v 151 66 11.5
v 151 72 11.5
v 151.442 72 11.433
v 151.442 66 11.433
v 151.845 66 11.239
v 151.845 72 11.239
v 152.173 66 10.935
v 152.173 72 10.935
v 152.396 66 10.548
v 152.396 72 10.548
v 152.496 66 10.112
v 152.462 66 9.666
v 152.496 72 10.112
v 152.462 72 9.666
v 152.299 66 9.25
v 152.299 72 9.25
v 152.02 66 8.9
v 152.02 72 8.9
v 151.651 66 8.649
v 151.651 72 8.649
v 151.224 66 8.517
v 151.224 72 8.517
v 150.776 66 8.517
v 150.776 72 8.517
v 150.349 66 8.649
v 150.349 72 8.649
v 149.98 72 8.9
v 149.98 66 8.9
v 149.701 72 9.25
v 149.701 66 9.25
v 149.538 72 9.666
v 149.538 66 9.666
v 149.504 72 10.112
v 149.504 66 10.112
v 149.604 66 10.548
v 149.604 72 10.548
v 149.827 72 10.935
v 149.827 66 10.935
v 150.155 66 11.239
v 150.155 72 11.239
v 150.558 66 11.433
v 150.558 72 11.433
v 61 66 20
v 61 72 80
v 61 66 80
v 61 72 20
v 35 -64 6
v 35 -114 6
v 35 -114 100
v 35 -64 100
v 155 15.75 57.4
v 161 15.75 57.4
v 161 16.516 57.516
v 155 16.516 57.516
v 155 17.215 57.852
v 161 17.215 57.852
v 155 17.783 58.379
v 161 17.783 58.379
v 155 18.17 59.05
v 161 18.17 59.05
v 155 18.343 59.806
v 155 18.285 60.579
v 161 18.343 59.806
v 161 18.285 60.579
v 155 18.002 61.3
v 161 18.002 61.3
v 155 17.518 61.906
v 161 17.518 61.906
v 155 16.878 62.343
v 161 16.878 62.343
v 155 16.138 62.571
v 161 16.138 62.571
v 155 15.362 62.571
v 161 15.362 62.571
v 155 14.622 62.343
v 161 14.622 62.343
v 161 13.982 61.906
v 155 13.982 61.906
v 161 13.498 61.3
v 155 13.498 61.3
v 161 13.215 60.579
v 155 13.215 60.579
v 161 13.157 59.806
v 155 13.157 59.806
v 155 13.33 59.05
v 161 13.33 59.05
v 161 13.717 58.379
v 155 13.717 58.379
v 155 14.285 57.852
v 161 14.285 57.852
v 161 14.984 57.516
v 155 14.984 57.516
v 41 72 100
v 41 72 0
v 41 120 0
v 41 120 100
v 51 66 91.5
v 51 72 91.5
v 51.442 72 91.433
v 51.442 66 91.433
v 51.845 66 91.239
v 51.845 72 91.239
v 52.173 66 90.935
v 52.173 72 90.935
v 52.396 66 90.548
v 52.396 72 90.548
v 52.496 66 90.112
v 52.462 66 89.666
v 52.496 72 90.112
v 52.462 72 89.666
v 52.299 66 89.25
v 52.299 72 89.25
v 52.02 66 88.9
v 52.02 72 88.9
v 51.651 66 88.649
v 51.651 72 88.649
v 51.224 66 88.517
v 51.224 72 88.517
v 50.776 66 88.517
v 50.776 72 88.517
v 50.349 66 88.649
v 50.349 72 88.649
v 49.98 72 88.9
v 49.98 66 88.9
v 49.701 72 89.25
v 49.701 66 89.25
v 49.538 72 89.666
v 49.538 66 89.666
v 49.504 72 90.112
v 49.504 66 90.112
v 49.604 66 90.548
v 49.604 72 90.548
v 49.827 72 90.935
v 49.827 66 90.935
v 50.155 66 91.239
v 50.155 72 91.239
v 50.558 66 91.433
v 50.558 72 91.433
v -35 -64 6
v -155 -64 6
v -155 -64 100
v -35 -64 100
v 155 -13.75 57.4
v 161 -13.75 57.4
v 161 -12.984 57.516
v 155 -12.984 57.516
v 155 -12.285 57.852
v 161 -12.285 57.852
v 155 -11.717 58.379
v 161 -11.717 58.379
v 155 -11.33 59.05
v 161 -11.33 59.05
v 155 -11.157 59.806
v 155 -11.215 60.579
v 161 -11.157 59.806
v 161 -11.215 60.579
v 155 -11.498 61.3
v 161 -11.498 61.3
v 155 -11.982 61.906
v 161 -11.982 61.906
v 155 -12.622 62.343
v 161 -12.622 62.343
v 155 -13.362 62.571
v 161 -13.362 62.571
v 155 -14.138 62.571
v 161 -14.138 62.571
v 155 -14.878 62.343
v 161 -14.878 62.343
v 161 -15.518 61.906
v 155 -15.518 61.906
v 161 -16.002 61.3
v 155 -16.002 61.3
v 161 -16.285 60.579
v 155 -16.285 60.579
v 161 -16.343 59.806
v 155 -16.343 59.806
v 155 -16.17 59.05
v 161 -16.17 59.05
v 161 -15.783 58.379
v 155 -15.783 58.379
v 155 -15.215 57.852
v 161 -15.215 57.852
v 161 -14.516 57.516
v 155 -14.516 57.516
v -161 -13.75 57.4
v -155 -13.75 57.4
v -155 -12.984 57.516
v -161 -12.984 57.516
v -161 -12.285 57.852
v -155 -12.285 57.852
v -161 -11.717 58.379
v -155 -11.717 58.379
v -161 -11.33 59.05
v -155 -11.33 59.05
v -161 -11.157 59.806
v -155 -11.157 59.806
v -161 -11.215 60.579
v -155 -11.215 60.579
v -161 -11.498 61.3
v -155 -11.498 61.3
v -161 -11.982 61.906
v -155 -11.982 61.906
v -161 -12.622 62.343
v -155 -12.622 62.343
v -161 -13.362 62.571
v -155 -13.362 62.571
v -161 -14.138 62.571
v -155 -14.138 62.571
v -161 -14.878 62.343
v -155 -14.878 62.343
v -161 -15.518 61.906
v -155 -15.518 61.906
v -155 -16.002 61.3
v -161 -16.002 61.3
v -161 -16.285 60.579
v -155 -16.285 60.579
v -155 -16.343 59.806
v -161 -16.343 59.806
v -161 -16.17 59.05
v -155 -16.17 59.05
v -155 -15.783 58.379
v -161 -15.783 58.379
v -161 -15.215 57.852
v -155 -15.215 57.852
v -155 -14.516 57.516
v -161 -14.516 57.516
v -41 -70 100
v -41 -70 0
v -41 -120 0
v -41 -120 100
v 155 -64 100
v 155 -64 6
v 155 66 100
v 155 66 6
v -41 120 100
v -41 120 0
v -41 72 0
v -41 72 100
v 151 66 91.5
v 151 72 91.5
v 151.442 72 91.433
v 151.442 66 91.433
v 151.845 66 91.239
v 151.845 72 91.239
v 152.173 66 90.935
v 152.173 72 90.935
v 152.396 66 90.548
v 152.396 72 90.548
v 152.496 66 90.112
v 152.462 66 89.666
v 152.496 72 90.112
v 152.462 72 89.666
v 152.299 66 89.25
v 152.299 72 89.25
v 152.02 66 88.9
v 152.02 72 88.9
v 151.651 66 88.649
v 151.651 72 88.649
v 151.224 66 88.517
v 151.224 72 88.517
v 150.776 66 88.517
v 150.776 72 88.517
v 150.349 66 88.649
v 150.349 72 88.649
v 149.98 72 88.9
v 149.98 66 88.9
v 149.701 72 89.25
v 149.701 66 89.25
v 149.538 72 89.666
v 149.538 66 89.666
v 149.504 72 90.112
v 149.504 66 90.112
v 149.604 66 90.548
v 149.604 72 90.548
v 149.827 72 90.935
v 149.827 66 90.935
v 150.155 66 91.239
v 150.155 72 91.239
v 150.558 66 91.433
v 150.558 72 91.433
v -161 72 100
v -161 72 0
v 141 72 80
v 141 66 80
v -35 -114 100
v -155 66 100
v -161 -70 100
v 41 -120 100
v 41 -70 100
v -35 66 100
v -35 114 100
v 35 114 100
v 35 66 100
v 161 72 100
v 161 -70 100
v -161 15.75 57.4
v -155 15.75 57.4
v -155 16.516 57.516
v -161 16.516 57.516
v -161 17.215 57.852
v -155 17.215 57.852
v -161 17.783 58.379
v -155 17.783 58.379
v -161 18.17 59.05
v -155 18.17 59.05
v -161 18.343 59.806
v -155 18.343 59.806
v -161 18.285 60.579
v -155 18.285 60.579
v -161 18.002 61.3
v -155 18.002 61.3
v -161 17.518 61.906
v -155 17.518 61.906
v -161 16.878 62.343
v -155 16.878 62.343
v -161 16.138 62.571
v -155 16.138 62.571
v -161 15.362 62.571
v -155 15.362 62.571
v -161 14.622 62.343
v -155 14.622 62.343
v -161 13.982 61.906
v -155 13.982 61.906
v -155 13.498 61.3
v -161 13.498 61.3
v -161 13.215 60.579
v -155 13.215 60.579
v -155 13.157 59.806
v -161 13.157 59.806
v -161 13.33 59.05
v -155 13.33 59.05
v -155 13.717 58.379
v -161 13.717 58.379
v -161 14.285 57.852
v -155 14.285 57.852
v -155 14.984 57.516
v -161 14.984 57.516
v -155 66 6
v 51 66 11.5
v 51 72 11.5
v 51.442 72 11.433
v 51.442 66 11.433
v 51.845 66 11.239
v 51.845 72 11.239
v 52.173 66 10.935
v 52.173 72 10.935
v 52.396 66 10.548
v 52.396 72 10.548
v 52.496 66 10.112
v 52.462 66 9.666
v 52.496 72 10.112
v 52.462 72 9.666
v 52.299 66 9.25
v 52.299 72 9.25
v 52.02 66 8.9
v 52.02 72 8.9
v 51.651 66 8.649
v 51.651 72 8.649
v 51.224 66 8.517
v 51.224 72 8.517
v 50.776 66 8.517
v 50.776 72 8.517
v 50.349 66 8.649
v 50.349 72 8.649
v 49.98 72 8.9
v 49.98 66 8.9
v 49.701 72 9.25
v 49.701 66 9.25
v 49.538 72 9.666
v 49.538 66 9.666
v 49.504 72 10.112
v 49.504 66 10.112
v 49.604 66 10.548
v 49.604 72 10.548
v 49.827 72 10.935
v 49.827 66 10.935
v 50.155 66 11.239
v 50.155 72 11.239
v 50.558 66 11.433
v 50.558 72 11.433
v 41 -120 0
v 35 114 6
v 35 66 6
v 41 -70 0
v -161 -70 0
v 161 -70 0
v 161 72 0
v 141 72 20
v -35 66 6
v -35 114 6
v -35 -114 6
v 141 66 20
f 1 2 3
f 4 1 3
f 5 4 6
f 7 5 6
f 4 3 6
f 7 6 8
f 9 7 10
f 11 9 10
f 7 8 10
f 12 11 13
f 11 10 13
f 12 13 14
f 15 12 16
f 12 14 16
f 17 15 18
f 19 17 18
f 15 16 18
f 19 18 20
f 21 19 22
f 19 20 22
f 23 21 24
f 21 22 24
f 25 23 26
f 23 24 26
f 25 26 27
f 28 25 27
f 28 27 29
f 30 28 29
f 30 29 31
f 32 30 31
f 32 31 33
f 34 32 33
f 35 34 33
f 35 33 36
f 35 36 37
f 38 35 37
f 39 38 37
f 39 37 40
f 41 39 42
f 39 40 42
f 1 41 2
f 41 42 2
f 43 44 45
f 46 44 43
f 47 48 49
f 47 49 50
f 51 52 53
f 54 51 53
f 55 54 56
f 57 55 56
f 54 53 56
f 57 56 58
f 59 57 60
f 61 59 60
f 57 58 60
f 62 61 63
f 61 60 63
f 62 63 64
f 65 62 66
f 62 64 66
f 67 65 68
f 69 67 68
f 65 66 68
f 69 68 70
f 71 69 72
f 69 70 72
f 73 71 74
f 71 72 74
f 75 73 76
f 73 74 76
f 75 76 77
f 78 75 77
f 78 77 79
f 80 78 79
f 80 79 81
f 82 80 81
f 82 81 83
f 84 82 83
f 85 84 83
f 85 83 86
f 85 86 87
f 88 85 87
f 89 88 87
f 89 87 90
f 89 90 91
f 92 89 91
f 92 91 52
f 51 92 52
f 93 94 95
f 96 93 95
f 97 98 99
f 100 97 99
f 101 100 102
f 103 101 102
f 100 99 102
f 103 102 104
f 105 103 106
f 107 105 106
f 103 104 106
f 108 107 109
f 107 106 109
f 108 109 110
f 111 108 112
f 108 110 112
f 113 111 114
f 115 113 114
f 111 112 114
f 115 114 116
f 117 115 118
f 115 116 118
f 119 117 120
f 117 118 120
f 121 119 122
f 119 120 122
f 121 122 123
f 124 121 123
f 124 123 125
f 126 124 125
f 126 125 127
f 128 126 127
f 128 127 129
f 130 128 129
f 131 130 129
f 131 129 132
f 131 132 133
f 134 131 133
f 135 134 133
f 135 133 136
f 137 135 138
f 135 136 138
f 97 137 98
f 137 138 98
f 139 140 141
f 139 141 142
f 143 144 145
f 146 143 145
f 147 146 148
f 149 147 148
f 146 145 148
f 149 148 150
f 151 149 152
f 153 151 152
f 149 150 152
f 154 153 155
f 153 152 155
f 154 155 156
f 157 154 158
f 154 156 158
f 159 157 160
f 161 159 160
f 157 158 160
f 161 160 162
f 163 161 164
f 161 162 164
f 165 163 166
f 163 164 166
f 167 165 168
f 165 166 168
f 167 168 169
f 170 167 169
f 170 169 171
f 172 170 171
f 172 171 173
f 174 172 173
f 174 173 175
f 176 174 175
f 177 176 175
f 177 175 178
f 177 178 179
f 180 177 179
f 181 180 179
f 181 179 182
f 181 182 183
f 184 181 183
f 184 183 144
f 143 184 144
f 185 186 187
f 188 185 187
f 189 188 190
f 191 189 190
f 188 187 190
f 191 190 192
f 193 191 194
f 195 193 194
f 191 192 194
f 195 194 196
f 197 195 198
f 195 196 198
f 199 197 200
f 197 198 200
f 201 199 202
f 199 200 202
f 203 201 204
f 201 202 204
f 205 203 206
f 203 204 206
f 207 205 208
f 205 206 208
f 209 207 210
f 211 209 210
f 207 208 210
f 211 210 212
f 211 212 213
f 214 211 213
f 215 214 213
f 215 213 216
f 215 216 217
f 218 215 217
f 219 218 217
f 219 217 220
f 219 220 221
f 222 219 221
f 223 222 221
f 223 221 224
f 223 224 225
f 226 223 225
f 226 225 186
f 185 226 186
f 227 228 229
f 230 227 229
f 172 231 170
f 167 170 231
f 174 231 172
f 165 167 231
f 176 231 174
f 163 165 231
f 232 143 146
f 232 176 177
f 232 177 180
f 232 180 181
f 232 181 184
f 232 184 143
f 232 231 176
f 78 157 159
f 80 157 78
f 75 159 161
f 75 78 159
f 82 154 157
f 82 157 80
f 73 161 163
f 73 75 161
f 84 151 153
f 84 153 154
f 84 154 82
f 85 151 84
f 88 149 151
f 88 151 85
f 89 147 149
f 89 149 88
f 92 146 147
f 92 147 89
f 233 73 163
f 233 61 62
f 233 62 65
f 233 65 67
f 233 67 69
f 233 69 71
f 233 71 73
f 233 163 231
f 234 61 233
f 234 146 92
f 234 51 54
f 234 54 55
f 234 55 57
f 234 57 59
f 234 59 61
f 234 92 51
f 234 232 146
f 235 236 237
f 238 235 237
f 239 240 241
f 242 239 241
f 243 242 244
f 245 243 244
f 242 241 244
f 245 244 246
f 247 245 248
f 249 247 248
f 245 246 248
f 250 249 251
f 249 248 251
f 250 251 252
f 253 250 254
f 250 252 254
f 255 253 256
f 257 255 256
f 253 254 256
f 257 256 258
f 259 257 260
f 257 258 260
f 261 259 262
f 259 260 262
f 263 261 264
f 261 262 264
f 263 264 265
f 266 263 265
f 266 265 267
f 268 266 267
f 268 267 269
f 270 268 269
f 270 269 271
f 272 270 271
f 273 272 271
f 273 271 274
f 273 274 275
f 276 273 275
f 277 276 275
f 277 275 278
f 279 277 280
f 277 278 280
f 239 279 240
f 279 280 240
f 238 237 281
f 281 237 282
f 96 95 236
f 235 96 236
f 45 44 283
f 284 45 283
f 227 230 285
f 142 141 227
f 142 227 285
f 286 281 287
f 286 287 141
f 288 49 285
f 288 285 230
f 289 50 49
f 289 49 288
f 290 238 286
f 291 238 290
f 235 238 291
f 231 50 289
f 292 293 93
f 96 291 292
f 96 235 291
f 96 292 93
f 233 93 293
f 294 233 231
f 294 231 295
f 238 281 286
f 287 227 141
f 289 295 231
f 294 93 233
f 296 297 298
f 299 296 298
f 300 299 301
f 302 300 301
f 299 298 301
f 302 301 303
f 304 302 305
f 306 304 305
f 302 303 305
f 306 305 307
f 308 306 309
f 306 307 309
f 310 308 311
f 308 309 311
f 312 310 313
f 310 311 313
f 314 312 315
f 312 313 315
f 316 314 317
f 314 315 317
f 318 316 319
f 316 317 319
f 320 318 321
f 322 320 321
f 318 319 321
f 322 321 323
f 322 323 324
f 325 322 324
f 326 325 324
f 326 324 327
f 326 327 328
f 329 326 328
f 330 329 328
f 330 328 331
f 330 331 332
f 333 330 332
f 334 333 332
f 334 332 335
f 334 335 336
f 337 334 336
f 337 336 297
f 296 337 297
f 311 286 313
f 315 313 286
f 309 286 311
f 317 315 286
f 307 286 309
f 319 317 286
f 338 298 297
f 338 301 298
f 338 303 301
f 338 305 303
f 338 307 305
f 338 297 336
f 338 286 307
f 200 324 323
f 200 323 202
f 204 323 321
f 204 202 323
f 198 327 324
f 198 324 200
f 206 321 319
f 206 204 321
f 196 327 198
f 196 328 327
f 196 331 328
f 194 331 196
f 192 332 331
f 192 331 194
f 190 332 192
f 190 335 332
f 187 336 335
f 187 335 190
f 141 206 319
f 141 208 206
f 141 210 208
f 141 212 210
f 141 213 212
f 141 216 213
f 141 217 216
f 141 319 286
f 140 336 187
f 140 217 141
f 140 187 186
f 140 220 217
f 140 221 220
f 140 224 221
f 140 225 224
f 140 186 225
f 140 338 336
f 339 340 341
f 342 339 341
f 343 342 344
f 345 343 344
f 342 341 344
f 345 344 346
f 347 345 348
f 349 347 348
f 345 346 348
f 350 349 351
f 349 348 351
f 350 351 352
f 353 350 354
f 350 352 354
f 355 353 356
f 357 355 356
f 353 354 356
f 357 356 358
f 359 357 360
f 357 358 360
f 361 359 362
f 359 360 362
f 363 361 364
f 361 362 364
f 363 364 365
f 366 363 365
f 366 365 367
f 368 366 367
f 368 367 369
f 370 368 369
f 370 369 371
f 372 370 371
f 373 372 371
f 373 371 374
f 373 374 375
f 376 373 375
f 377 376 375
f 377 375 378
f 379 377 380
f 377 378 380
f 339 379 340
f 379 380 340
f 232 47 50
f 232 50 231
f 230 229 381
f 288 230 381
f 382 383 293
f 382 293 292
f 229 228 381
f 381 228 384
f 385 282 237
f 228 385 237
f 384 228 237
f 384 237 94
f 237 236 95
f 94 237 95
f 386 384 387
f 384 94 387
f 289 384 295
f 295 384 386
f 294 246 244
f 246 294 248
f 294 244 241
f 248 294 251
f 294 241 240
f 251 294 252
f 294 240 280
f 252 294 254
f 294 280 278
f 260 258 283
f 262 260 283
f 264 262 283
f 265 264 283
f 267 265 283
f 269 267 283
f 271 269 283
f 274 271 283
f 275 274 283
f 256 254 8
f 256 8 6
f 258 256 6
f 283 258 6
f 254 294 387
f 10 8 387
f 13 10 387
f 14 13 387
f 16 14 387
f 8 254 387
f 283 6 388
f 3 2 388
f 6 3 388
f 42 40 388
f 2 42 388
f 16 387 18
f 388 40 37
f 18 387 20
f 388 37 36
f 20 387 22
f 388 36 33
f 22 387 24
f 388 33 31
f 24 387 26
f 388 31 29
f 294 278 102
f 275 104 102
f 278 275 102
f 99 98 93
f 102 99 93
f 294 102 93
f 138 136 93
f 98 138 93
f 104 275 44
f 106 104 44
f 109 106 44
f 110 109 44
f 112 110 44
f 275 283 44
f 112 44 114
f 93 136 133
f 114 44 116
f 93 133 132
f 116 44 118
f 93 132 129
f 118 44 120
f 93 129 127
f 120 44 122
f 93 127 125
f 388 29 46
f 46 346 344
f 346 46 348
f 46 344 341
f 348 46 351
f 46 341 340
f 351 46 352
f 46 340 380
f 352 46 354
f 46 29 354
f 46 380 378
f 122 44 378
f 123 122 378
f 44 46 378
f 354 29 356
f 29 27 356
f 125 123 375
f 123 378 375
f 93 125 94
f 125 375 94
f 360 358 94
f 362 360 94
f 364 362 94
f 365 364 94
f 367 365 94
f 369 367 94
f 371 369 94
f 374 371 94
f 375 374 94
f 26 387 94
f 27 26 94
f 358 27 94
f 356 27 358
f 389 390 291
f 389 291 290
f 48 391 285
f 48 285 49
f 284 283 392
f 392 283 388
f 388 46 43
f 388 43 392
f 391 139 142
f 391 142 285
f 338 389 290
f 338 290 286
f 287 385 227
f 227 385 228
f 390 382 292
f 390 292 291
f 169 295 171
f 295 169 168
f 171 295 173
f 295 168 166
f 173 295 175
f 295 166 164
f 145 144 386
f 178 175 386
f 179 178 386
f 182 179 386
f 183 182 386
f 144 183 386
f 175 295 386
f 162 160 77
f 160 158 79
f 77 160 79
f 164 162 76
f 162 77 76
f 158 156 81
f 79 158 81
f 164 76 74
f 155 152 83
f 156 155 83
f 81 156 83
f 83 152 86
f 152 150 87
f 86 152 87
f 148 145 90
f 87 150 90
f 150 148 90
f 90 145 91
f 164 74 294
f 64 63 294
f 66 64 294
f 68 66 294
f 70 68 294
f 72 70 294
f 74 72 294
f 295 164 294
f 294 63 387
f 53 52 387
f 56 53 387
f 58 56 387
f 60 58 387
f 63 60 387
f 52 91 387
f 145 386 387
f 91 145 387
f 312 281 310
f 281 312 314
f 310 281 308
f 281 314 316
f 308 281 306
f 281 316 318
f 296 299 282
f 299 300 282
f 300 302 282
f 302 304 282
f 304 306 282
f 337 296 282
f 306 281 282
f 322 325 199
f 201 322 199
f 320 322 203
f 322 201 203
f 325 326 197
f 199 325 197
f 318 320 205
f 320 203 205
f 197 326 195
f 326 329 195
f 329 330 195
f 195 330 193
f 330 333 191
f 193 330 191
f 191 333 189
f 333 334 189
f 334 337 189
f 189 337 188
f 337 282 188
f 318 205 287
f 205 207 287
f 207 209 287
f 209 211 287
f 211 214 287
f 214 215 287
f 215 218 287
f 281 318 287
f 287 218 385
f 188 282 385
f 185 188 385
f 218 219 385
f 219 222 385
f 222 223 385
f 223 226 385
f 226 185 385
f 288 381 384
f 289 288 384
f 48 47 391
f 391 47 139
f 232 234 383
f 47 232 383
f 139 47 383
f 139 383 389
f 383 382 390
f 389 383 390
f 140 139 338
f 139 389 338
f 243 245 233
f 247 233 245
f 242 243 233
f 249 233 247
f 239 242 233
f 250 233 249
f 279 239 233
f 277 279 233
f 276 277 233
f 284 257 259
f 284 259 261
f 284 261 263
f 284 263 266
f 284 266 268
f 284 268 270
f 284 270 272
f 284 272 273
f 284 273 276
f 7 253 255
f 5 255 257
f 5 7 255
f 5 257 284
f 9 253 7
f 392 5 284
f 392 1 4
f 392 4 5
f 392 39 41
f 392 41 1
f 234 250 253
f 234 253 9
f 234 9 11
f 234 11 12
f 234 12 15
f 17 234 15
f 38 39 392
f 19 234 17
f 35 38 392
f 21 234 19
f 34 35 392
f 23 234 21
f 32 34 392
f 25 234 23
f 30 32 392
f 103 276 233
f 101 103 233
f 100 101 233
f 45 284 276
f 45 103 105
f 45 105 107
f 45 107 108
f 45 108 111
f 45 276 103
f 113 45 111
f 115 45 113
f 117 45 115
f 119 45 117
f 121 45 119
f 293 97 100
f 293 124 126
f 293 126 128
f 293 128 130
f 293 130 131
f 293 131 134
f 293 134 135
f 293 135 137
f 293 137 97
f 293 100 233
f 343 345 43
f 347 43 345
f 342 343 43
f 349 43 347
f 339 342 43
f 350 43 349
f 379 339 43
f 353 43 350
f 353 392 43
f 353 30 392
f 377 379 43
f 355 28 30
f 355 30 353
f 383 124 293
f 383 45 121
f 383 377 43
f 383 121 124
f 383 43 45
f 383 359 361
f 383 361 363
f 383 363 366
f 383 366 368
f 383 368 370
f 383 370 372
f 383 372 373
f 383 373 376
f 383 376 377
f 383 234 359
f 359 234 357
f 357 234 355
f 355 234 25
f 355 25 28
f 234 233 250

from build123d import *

# Parameters (mm, degrees)
SALIENTE_EXTRUIR1_DEPTH = 100
SALIENTE_EXTRUIR2_DEPTH = 6
CROQUIS4_R              = 1.5
CROQUIS4_W              = 80
CROQUIS4_H              = 60
CORTAR_EXTRUIR2_DEPTH   = 6
CROQUIS5_R              = 2.6
CORTAR_EXTRUIR3_DEPTH   = 358.888250715


with BuildPart() as part:
    # Croquis1 → Saliente-Extruir1 (new body)
    with BuildSketch(Plane.XY):
        Polygon((-41, 72), (-161, 72), (-161, -70), (-41, -70), (-41, -120), (41, -120), (41, -70), (161, -70), (161, 72), (41, 72), (41, 120), (-41, 120), align=None)
        Polygon((155, 66), (35, 66), (35, 114), (-35, 114), (-35, 66), (-155, 66), (-155, -64), (-35, -64), (-35, -114), (35, -114), (35, -64), (155, -64), align=None, mode=Mode.SUBTRACT)
    extrude(amount=SALIENTE_EXTRUIR1_DEPTH)

    # Croquis2 → Saliente-Extruir2 (add)
    with BuildSketch(Plane(origin=(0, 0, 0), x_dir=(-1, 0, 0), z_dir=(0, 0, -1))):
        Polygon((41, 72), (41, 120), (-41, 120), (-41, 72), (-161, 72), (-161, -70), (-41, -70), (-41, -120), (41, -120), (41, -70), (161, -70), (161, 72), align=None)
    extrude(amount=-SALIENTE_EXTRUIR2_DEPTH)

    # Croquis4 → Cortar-Extruir2 (cut)
    with BuildSketch(Plane(origin=(0, 72, 0), x_dir=(1, 0, 0), z_dir=(0, 1, 0))):
        with Locations(Location((151, -90, 0), (0, 0, 270))):
            Circle(CROQUIS4_R)
        with Locations(Location((51, -90, 0), (0, 0, 270))):
            Circle(CROQUIS4_R)
        with Locations(Location((51, -10, 0), (0, 0, 270))):
            Circle(CROQUIS4_R)
        with Locations(Location((151, -10, 0), (0, 0, 270))):
            Circle(CROQUIS4_R)
        with Locations((101, -50)):
            Rectangle(CROQUIS4_W, CROQUIS4_H)
    extrude(amount=-CORTAR_EXTRUIR2_DEPTH, mode=Mode.SUBTRACT)

    # Croquis5 → Cortar-Extruir3 (cut, through all)
    with BuildSketch(Plane(origin=(161, 0, 0), x_dir=(0, 0, -1), z_dir=(1, 0, 0))):
        with Locations((-60, -13.75)):
            Circle(CROQUIS5_R)
        with Locations((-60, 15.75)):
            Circle(CROQUIS5_R)
    extrude(amount=-CORTAR_EXTRUIR3_DEPTH, mode=Mode.SUBTRACT)


solid = part.part
